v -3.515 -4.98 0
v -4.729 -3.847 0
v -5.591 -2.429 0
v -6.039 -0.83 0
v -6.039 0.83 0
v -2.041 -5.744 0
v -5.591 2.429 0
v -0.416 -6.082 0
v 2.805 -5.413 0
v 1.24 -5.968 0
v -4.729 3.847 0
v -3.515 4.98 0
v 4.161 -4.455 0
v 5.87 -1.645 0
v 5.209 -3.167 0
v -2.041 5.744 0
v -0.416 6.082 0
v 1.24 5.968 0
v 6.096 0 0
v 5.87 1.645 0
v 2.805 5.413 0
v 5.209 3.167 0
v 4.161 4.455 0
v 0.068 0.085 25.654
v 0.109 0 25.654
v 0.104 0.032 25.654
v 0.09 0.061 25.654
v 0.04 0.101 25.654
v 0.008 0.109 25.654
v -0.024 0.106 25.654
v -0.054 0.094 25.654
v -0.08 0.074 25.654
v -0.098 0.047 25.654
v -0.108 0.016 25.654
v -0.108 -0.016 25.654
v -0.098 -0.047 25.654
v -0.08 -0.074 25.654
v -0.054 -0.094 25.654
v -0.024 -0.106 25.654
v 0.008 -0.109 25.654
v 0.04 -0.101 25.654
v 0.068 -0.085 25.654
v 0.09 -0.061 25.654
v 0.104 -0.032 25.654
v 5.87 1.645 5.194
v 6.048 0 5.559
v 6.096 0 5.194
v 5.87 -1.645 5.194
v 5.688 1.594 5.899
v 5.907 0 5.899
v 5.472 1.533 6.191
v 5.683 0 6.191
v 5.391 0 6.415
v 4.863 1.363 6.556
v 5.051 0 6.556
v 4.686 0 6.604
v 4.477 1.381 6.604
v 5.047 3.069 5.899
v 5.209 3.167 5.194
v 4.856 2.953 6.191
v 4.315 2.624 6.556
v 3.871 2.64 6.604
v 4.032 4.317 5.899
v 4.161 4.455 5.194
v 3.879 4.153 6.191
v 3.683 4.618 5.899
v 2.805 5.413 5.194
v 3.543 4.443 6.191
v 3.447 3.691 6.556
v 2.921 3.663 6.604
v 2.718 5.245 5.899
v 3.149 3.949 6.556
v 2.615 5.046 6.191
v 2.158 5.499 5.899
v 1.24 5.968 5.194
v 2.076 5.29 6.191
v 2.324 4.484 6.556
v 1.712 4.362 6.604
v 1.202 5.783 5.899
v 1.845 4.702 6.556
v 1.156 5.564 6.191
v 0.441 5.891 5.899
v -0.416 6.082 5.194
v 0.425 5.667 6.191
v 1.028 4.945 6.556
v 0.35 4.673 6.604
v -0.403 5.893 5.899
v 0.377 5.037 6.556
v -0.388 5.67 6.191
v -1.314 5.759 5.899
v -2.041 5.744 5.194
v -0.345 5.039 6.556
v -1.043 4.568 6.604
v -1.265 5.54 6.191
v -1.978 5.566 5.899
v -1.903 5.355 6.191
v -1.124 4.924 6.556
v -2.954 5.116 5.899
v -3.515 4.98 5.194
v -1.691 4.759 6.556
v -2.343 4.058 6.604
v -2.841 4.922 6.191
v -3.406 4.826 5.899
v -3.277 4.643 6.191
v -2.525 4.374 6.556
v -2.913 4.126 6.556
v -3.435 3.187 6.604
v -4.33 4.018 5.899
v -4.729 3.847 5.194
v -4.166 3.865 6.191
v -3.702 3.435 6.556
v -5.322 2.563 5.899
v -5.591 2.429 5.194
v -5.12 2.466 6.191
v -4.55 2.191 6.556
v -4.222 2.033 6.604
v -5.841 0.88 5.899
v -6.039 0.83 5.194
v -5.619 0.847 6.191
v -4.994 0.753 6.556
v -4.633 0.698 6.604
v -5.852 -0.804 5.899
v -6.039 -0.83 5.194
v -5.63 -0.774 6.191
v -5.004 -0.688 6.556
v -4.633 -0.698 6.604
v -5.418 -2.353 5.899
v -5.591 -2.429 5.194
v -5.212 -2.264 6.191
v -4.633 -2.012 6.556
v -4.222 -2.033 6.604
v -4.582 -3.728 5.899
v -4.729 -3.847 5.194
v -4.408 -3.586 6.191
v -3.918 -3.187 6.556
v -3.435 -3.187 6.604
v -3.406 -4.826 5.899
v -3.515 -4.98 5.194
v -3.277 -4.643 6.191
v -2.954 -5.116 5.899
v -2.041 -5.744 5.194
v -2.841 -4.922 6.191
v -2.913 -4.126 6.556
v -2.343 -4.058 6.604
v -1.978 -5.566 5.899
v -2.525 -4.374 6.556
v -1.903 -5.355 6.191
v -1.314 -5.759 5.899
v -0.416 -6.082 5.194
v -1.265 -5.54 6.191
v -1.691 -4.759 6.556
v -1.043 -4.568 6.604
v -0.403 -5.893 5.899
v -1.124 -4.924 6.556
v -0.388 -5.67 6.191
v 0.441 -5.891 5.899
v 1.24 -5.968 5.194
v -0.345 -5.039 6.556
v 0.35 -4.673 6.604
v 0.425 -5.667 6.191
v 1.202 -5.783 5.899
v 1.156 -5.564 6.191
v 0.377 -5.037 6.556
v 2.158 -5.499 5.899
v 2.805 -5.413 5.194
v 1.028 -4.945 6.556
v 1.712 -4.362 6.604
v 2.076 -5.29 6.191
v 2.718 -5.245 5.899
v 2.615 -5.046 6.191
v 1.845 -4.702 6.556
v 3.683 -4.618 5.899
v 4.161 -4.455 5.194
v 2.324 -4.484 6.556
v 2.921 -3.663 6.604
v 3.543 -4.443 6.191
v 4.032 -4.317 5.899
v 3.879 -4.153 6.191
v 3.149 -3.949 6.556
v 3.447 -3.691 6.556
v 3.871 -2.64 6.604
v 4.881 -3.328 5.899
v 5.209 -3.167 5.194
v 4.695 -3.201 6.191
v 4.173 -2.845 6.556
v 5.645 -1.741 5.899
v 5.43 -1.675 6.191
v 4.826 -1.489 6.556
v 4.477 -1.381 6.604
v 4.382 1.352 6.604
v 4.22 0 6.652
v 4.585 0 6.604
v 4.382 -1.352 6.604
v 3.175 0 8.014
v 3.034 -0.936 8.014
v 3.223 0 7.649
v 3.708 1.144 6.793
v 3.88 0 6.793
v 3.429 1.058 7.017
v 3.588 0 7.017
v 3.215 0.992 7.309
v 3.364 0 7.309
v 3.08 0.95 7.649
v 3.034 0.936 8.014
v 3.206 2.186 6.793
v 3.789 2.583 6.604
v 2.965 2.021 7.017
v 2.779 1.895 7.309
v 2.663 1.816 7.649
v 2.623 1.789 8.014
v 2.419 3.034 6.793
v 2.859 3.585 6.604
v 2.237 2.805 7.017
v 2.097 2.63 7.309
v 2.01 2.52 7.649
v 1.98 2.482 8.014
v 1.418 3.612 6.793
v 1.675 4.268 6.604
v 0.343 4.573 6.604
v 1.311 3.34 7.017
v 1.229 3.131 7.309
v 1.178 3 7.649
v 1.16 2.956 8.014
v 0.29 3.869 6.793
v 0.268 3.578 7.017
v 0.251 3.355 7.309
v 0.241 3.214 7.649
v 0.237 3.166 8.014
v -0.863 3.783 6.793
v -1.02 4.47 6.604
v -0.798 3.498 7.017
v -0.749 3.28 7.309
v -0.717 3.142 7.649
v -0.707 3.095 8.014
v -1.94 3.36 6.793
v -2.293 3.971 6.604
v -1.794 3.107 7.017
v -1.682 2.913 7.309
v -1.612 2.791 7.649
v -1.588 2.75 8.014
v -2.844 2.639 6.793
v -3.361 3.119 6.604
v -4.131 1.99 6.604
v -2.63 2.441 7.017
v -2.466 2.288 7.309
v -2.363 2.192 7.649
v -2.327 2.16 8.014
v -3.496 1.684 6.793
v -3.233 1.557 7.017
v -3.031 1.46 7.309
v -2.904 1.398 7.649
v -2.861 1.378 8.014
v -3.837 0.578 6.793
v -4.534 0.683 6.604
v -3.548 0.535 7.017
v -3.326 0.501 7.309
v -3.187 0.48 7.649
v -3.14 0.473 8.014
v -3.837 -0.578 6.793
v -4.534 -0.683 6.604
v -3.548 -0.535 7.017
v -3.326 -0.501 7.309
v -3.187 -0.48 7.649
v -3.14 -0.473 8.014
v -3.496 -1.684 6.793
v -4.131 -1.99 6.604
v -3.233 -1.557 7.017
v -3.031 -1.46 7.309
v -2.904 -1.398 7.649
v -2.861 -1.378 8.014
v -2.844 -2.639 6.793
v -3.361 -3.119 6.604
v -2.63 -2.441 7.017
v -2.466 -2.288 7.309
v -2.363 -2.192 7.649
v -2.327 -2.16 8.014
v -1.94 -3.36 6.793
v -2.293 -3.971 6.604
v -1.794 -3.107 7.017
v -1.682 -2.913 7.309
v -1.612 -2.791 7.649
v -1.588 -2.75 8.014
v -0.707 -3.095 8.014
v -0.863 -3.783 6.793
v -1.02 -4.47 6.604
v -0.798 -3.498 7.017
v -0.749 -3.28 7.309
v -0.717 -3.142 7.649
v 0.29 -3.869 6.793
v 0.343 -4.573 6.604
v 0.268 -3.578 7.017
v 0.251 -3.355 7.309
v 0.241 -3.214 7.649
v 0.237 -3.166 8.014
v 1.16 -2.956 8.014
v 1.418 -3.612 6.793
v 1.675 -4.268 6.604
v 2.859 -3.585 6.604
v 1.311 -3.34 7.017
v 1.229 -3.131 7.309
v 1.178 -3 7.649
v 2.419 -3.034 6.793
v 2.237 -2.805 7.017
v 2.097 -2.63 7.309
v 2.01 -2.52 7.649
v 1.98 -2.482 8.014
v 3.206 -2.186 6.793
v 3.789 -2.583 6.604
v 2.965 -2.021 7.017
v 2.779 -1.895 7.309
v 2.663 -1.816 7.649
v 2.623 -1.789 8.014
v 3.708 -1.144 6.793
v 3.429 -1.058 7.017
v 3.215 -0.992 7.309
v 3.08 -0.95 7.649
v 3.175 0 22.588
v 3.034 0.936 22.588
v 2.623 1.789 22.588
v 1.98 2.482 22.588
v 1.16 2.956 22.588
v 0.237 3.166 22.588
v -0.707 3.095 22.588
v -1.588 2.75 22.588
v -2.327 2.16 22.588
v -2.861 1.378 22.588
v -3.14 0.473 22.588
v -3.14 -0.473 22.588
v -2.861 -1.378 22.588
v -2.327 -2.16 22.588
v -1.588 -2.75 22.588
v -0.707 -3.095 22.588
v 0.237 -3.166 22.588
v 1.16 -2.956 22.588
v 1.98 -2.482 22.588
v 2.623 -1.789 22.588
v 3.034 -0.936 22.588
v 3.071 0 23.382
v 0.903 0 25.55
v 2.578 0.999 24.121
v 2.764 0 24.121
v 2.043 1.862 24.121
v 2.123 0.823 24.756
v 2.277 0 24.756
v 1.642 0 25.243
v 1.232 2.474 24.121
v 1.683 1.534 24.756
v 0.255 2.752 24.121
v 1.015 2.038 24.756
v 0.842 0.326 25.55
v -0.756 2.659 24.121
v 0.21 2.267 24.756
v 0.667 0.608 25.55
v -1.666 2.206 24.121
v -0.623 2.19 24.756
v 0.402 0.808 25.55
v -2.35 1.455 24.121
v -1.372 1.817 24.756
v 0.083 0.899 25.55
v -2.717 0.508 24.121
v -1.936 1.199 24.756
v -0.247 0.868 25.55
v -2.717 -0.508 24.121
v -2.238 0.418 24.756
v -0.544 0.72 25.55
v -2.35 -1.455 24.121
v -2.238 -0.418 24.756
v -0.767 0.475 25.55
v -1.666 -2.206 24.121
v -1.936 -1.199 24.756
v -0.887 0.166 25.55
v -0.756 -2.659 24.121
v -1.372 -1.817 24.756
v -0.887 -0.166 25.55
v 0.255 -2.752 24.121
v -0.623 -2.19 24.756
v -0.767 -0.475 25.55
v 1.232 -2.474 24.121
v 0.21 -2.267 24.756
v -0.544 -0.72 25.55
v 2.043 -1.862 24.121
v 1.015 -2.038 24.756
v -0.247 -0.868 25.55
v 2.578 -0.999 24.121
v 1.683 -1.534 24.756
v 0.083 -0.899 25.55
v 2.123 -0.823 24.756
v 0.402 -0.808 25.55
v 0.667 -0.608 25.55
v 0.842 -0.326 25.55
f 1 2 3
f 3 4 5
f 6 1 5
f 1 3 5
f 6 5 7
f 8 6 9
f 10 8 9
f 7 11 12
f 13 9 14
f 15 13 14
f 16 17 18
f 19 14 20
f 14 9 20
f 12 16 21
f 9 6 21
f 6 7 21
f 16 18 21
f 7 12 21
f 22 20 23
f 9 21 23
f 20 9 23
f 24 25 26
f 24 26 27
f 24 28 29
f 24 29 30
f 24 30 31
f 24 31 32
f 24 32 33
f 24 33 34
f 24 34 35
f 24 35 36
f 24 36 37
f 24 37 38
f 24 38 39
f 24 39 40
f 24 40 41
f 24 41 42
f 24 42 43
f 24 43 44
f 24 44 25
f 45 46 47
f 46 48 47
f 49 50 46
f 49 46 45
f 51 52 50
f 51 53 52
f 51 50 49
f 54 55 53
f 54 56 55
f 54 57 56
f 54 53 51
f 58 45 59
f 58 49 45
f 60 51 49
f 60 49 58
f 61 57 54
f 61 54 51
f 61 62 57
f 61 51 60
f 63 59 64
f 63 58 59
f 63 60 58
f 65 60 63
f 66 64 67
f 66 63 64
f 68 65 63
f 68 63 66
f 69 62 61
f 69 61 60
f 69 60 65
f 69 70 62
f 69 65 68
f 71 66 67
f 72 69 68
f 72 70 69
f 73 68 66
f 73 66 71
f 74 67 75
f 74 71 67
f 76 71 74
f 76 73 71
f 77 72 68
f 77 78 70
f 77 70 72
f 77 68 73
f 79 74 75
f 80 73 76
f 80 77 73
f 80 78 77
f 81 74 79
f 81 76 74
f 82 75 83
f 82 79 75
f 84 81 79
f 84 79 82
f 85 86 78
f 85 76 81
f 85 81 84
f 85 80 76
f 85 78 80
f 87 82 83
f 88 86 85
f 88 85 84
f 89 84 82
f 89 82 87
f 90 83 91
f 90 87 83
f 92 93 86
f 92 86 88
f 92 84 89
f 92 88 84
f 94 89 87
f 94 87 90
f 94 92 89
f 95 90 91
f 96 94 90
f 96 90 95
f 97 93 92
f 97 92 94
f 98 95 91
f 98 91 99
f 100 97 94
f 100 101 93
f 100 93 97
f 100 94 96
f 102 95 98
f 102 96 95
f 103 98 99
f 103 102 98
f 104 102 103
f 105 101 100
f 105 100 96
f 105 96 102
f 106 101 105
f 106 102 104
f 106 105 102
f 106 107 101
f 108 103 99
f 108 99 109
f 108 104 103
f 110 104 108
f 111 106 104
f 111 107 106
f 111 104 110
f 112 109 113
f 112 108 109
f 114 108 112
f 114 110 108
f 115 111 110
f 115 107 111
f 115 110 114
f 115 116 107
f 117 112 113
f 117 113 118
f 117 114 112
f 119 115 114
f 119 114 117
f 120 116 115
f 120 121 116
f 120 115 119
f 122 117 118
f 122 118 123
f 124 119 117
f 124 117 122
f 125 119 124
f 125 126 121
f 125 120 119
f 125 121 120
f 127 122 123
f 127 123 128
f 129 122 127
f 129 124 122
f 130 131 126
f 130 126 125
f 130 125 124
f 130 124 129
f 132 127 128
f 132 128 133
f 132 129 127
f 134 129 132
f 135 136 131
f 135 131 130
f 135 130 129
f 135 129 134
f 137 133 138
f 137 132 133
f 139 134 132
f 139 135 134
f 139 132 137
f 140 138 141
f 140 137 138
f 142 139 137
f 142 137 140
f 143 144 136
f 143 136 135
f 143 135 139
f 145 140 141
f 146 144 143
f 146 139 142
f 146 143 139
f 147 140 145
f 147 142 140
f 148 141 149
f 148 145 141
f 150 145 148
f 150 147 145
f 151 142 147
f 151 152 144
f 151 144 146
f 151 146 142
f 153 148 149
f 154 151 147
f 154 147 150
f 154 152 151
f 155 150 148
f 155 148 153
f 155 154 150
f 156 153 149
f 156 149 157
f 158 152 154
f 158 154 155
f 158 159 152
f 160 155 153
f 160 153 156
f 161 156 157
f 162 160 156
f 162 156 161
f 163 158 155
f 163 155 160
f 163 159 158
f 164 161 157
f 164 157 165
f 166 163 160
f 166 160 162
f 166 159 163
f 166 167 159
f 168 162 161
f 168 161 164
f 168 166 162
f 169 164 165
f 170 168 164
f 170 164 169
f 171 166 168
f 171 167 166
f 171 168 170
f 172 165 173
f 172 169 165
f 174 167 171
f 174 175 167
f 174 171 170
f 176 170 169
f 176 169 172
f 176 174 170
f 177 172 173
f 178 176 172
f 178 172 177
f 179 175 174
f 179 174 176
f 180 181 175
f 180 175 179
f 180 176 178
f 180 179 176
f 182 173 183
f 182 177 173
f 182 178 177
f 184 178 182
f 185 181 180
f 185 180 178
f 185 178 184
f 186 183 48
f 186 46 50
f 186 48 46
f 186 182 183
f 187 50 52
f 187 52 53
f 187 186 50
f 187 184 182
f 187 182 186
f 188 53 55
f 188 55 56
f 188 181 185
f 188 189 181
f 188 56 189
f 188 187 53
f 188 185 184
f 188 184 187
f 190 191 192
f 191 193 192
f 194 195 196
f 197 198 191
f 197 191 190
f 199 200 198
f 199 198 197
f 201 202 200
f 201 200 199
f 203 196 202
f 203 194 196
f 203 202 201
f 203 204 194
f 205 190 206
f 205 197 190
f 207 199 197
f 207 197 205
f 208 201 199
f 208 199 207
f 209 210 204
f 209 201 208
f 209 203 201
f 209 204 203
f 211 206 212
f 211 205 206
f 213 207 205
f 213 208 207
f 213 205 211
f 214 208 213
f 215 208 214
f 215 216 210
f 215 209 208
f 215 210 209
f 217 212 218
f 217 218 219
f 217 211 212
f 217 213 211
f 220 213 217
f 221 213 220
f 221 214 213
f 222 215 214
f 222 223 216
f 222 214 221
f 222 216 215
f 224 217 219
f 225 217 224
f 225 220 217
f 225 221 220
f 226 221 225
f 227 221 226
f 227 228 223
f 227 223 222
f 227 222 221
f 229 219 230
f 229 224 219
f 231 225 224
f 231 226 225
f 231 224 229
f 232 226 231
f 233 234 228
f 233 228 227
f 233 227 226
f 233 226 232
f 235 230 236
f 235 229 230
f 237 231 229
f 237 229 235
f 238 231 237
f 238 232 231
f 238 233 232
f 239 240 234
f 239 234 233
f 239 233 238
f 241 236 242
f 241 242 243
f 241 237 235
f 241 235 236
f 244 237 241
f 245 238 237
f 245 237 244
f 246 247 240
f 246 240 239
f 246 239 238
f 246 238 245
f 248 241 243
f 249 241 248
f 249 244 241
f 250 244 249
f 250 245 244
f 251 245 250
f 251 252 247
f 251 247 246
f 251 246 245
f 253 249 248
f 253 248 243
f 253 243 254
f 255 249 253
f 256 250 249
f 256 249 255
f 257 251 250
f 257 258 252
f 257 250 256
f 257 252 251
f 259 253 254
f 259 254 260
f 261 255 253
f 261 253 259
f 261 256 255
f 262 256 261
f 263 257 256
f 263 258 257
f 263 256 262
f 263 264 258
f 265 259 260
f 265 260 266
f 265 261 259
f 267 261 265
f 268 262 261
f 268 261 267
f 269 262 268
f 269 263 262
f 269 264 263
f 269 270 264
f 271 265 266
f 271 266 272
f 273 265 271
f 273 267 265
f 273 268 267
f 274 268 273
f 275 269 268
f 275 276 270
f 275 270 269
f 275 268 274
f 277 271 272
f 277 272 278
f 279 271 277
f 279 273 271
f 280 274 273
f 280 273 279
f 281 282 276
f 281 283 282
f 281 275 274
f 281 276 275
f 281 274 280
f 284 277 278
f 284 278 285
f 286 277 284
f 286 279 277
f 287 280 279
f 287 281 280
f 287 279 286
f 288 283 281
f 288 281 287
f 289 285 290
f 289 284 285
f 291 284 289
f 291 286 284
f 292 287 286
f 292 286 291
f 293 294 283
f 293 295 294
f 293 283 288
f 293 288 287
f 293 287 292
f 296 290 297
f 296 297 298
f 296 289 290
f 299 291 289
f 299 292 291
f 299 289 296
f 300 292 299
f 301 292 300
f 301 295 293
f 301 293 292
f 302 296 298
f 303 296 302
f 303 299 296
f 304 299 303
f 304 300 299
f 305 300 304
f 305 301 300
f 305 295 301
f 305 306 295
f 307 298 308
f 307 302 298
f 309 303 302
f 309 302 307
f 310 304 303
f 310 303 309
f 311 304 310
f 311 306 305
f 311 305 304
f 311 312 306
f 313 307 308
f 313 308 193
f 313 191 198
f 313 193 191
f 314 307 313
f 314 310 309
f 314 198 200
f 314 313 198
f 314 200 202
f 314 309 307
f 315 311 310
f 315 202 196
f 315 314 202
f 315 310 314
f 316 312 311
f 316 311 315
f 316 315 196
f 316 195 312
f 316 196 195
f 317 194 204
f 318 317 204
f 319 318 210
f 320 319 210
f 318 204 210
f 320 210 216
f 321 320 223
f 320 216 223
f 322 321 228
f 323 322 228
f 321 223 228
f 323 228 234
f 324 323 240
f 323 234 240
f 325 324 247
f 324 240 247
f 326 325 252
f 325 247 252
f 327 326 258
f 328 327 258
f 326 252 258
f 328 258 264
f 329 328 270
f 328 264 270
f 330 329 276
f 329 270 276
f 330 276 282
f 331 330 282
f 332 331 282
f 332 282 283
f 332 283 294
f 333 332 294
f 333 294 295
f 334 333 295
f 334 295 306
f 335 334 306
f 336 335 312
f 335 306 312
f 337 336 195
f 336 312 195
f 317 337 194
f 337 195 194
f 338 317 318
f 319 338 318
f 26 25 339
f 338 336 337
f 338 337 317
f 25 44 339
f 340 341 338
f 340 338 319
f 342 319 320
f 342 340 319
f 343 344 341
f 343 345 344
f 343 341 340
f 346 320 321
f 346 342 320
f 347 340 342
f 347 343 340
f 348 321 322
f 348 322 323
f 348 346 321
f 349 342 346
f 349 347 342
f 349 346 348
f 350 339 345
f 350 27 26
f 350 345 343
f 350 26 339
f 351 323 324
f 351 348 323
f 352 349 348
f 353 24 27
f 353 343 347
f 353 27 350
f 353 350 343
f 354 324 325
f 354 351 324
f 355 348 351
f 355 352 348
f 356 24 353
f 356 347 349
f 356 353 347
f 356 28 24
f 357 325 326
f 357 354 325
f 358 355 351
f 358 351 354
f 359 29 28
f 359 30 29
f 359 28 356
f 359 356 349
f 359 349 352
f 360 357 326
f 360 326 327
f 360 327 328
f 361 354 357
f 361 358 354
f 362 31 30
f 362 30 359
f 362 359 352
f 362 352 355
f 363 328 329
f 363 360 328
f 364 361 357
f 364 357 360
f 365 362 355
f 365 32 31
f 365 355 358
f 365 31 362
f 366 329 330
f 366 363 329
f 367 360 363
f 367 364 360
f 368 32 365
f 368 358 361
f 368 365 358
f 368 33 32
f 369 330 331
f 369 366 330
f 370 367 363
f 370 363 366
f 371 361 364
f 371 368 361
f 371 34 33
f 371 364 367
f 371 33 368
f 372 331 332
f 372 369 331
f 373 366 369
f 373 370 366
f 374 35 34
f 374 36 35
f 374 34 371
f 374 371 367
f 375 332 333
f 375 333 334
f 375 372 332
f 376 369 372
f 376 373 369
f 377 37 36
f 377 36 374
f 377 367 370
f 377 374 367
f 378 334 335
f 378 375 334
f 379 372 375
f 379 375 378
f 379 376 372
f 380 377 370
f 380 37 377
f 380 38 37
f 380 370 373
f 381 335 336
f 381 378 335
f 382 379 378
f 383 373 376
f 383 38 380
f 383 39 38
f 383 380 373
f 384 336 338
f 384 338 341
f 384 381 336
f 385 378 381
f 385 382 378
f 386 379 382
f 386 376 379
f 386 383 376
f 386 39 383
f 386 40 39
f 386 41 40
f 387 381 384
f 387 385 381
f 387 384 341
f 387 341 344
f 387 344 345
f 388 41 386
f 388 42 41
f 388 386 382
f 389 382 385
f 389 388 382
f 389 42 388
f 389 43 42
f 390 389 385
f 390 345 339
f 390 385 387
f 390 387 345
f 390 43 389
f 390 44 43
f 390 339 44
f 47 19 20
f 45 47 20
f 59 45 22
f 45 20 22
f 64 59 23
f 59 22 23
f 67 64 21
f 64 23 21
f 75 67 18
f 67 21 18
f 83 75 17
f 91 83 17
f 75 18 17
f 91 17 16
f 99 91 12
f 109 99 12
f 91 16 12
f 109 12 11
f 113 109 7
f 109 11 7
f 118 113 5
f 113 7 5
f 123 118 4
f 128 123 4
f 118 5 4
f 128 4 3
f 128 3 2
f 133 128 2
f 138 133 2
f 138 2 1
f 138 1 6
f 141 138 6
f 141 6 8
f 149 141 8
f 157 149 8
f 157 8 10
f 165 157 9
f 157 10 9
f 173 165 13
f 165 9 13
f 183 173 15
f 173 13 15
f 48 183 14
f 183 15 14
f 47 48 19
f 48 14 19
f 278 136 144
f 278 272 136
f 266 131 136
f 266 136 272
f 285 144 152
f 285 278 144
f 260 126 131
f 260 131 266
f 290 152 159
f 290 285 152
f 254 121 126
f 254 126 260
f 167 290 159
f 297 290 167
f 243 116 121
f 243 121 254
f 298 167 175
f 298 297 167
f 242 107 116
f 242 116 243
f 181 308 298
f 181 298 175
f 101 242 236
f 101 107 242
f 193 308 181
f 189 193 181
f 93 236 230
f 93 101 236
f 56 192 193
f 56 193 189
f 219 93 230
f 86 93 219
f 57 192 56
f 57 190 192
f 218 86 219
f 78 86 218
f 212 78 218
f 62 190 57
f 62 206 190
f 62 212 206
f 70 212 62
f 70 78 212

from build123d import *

# Parameters (mm, degrees)
F0_R     = 6.096
F1_DEPTH = 6.604
F2_R     = 3.175
F3_DEPTH = 19.05
F4_R     = 1.4103835631
F5_R     = 3.0660512242


with BuildPart() as f1:
    # F0 (on Top) → F1 (new body)
    with BuildSketch(Plane.XY):
        Circle(F0_R)
    extrude(amount=F1_DEPTH)

    # F2 (on face) → F3 (join)
    with BuildSketch(Plane.XY.offset(6.604)):
        Circle(F2_R)
    extrude(amount=F3_DEPTH)

    # F4
    f4_edges = [f1.edges().sort_by_distance(p)[0] for p in [
        (-6.096, 0, 6.604),
        (-3.175, 0, 6.604),
    ]]
    fillet(f4_edges, radius=F4_R)

    # F5
    f5_edges = [f1.edges().sort_by_distance(p)[0] for p in [
        (3.175, 0, 16.834192),
        (-3.175, 0, 8.014384),
        (-3.175, 0, 25.654),
    ]]
    fillet(f5_edges, radius=F5_R)


solid = f1.part
